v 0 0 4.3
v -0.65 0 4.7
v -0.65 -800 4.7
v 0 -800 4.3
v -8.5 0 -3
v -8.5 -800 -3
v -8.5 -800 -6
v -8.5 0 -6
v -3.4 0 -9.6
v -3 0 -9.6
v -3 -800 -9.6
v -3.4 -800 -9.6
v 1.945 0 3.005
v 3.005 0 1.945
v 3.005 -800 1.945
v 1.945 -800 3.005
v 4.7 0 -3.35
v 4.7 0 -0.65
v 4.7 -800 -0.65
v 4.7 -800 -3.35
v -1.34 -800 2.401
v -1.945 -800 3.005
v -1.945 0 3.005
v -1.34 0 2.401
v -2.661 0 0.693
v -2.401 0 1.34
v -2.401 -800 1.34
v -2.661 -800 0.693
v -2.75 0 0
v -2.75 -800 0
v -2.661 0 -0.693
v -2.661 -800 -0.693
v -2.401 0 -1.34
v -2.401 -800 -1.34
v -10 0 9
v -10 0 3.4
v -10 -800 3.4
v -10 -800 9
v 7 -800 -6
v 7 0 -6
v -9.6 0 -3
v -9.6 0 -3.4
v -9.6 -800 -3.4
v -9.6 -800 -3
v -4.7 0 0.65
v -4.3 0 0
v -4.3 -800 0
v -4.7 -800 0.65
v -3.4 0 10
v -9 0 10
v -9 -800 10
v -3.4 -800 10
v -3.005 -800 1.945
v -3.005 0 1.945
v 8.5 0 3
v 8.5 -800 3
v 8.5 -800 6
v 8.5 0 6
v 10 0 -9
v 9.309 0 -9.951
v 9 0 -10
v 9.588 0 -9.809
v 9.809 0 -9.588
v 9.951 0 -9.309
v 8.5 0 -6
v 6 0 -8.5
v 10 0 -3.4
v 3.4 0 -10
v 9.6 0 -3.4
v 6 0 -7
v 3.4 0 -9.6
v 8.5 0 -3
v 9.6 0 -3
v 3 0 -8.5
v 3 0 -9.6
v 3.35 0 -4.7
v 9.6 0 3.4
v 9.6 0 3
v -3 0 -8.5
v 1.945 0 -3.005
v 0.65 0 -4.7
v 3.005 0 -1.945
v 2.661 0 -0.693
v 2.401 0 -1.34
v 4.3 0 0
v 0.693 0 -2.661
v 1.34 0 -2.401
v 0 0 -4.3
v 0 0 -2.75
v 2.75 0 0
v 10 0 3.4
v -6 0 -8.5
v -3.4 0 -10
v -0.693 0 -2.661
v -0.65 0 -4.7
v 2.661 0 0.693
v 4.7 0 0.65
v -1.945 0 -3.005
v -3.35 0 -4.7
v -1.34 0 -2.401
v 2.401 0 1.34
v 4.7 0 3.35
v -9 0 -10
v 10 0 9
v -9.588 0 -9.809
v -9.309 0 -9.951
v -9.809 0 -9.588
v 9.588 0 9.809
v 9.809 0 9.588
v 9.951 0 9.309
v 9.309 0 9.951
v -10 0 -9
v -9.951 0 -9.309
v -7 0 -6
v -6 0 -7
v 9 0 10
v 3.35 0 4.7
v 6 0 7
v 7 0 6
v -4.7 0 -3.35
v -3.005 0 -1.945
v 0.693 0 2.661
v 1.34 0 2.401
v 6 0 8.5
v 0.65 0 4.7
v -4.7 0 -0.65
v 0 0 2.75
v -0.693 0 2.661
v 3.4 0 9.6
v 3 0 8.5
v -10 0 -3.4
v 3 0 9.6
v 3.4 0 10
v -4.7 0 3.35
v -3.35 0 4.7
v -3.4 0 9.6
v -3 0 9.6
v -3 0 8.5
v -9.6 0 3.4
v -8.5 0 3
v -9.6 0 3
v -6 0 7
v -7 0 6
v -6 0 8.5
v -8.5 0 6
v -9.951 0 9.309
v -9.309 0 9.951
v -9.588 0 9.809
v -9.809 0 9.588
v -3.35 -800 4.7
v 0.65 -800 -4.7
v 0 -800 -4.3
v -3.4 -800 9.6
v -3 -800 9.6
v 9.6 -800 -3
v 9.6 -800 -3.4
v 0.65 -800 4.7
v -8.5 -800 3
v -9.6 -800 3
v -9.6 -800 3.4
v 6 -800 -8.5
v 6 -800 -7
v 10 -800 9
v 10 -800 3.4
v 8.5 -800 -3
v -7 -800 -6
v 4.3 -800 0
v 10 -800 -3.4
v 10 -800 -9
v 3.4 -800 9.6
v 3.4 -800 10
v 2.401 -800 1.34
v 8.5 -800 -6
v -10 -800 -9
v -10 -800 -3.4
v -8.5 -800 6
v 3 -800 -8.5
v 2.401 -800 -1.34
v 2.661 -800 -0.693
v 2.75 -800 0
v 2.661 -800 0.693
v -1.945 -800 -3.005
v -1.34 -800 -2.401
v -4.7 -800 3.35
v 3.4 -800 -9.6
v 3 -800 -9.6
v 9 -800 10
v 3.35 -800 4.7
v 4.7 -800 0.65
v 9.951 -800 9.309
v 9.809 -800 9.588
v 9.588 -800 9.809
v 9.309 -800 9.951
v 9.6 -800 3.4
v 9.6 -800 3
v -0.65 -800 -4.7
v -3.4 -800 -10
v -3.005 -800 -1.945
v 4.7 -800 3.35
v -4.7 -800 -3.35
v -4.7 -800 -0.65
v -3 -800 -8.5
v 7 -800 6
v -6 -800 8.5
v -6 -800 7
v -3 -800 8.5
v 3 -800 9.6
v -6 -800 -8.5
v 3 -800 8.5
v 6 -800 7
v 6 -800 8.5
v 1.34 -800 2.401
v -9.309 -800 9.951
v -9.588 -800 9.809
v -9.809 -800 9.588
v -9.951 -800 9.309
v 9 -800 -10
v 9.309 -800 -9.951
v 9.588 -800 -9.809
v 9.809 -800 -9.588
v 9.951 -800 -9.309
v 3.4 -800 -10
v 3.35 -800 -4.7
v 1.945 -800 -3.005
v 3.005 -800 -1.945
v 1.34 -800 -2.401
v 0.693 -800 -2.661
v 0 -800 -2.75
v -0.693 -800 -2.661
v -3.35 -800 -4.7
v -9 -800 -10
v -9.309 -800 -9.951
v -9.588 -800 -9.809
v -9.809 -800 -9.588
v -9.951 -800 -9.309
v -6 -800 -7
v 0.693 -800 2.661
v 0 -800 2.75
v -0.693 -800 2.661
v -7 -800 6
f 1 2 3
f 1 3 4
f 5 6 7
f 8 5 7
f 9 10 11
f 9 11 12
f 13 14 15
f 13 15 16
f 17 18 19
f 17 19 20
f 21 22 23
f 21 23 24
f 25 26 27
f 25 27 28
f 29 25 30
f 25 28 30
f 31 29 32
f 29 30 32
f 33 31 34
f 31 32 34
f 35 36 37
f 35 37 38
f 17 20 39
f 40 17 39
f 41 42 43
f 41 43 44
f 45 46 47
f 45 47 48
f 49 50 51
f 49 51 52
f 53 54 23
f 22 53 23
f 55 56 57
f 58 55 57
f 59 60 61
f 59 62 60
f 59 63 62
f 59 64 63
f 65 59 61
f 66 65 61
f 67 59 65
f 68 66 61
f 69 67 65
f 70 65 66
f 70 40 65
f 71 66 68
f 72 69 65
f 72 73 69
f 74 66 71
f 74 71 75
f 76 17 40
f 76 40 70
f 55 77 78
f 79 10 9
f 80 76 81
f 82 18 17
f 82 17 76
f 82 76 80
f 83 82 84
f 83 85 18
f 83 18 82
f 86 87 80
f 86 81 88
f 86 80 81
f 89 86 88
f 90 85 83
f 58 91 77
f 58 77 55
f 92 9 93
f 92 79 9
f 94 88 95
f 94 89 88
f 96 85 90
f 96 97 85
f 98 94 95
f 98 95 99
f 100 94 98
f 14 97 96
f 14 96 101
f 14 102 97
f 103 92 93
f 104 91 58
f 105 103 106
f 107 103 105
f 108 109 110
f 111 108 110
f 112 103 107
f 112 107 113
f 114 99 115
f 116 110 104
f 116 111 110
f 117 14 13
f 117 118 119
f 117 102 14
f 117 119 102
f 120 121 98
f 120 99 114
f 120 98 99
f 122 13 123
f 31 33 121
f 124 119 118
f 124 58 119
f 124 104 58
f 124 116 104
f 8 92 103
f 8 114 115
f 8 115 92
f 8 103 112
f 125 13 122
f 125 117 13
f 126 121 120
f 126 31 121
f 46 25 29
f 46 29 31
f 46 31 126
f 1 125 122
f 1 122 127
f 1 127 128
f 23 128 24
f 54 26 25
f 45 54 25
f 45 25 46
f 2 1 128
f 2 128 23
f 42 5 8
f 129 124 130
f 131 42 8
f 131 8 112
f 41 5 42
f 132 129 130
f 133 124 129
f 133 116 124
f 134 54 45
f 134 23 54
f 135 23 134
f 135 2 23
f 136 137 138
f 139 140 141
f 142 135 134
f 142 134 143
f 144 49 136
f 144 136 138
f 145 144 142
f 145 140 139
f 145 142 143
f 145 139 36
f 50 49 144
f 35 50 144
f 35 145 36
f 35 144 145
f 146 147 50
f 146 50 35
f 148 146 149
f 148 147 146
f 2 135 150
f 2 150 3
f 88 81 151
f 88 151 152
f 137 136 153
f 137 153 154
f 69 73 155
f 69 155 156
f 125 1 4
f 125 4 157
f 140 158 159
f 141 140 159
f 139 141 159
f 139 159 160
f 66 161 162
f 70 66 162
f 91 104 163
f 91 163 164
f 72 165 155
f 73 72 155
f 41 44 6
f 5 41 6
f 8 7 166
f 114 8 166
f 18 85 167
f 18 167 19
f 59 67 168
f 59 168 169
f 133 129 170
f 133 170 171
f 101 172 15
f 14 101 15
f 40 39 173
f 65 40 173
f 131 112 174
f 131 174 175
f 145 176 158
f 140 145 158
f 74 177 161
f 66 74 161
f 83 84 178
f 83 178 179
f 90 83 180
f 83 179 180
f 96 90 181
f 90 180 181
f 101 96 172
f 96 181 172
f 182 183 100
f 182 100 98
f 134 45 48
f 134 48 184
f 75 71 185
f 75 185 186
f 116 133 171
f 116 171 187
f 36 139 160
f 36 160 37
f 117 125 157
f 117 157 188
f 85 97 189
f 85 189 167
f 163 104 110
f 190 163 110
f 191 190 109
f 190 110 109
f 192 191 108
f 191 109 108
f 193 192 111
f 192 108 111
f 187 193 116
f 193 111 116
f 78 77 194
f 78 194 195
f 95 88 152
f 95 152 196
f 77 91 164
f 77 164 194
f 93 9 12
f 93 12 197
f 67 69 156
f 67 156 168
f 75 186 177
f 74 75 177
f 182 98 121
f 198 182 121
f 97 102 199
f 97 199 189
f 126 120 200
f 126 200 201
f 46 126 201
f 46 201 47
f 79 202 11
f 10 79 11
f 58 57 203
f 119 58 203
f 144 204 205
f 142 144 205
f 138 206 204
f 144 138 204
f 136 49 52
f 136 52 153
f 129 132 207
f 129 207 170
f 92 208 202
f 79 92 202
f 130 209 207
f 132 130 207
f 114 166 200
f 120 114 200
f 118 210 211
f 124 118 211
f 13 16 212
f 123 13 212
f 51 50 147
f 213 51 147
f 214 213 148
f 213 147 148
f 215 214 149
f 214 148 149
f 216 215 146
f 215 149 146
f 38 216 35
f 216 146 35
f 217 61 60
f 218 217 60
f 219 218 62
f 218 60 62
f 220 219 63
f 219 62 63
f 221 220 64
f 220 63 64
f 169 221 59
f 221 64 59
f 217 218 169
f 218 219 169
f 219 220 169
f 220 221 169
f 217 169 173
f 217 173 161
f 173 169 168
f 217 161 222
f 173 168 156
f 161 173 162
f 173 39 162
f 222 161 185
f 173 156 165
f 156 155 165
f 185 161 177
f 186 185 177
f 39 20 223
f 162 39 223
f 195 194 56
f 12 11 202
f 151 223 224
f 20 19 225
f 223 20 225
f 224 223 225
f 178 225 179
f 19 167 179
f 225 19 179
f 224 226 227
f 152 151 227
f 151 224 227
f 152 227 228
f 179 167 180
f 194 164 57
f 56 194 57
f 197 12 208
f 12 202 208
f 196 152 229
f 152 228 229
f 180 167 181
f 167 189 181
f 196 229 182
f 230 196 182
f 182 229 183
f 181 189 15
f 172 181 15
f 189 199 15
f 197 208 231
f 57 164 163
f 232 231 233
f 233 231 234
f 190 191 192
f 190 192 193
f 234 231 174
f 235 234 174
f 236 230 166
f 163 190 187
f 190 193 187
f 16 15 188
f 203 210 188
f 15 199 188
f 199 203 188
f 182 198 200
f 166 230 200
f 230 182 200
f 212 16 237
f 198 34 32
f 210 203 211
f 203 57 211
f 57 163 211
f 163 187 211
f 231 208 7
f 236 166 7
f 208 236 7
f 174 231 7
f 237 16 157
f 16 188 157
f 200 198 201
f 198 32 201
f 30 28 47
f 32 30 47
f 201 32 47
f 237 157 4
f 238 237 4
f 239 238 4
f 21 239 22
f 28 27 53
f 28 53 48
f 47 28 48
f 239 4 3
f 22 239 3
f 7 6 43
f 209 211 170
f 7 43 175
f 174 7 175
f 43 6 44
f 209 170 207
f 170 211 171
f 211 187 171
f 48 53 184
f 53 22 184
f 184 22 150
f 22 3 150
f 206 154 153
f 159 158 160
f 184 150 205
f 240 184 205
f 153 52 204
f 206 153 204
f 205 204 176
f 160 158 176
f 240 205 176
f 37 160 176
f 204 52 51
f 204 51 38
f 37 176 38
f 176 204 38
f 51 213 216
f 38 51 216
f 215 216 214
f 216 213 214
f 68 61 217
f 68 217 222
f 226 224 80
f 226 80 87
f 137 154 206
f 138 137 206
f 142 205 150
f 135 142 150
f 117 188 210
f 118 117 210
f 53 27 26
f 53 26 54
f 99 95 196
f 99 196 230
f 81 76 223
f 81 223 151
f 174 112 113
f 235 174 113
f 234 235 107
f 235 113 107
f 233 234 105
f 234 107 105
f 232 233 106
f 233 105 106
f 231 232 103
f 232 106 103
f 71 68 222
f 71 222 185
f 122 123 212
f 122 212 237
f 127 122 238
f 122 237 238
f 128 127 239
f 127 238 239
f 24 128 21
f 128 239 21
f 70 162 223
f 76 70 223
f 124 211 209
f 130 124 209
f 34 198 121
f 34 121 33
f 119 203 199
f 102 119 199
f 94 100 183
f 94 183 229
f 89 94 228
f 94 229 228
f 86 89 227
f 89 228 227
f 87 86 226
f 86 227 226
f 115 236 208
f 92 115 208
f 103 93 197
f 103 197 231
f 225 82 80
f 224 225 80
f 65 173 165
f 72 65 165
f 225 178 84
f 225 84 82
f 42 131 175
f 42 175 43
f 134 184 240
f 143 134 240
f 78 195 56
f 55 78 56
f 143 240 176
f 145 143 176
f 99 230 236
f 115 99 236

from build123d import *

# Parameters (mm, degrees)
PAD_DEPTH          = 800
POCKET_DEPTH       = 800
POLARPATTERN_COUNT = 4
POCKET001_DEPTH    = 800


with BuildPart() as part:
    # Sketch → Pad (new body)
    with BuildSketch(Plane.XZ):
        with BuildLine():
            Line((-9, 10), (9, 10))
            ThreePointArc((10, 9), (9.707107, 9.707107), (9, 10))
            Line((10, 9), (10, -9))
            ThreePointArc((9, -10), (9.707107, -9.707107), (10, -9))
            Line((9, -10), (-9, -10))
            ThreePointArc((-10, -9), (-9.707107, -9.707107), (-9, -10))
            Line((-10, -9), (-10, 9))
            ThreePointArc((-9, 10), (-9.707107, 9.707107), (-10, 9))
        make_face()
    extrude(amount=PAD_DEPTH)

    # Sketch001 (on Face10 of Pad) → Pocket (cut)
    with BuildSketch(Plane.XZ.offset(800)):
        Polygon((-3.4, 10), (-3.4, 9.6), (-3, 9.6), (-3, 8.5), (-6, 8.5), (-6, 7), (-3.35, 4.7), (-0.65, 4.7), (0, 4.3), (0.65, 4.7), (3.35, 4.7), (6, 7), (6, 8.5), (3, 8.5), (3, 9.6), (3.4, 9.6), (3.4, 10), align=None)
    pocket = extrude(amount=-POCKET_DEPTH, mode=Mode.SUBTRACT)

    # PolarPattern: Pocket ×4 about axis
    polarpattern_axis = Axis((0, -800, 0), (0, -1, 0))
    for i in range(1, POLARPATTERN_COUNT):
        add(pocket.rotate(polarpattern_axis, i * 360 / POLARPATTERN_COUNT), mode=Mode.SUBTRACT)

    # Sketch002 (on Face4 of PolarPattern) → Pocket001 (cut)
    with BuildSketch(Plane.XZ.offset(800)):
        with BuildLine():
            ThreePointArc((1.340499, 2.401159), (0, 2.75), (-1.340499, 2.401159))
            Line((-1.944544, 3.005204), (-1.340499, 2.401159))
            Line((-3.005204, 1.944544), (-1.944544, 3.005204))
            Line((-2.401159, 1.340499), (-3.005204, 1.944544))
            ThreePointArc((-2.401159, 1.340499), (-2.75, 0), (-2.401159, -1.340499))
            Line((-3.005204, -1.944544), (-2.401159, -1.340499))
            Line((-1.944544, -3.005204), (-3.005204, -1.944544))
            Line((-1.340499, -2.401159), (-1.944544, -3.005204))
            ThreePointArc((-1.340499, -2.401159), (0, -2.75), (1.340499, -2.401159))
            Line((1.944544, -3.005204), (1.340499, -2.401159))
            Line((3.005204, -1.944544), (1.944544, -3.005204))
            Line((2.401159, -1.340499), (3.005204, -1.944544))
            ThreePointArc((2.401159, -1.340499), (2.75, 0), (2.401159, 1.340499))
            Line((2.401159, 1.340499), (3.005204, 1.944544))
            Line((3.005204, 1.944544), (1.944544, 3.005204))
            Line((1.944544, 3.005204), (1.340499, 2.401159))
        make_face()
    extrude(amount=-POCKET001_DEPTH, mode=Mode.SUBTRACT)


solid = part.part
